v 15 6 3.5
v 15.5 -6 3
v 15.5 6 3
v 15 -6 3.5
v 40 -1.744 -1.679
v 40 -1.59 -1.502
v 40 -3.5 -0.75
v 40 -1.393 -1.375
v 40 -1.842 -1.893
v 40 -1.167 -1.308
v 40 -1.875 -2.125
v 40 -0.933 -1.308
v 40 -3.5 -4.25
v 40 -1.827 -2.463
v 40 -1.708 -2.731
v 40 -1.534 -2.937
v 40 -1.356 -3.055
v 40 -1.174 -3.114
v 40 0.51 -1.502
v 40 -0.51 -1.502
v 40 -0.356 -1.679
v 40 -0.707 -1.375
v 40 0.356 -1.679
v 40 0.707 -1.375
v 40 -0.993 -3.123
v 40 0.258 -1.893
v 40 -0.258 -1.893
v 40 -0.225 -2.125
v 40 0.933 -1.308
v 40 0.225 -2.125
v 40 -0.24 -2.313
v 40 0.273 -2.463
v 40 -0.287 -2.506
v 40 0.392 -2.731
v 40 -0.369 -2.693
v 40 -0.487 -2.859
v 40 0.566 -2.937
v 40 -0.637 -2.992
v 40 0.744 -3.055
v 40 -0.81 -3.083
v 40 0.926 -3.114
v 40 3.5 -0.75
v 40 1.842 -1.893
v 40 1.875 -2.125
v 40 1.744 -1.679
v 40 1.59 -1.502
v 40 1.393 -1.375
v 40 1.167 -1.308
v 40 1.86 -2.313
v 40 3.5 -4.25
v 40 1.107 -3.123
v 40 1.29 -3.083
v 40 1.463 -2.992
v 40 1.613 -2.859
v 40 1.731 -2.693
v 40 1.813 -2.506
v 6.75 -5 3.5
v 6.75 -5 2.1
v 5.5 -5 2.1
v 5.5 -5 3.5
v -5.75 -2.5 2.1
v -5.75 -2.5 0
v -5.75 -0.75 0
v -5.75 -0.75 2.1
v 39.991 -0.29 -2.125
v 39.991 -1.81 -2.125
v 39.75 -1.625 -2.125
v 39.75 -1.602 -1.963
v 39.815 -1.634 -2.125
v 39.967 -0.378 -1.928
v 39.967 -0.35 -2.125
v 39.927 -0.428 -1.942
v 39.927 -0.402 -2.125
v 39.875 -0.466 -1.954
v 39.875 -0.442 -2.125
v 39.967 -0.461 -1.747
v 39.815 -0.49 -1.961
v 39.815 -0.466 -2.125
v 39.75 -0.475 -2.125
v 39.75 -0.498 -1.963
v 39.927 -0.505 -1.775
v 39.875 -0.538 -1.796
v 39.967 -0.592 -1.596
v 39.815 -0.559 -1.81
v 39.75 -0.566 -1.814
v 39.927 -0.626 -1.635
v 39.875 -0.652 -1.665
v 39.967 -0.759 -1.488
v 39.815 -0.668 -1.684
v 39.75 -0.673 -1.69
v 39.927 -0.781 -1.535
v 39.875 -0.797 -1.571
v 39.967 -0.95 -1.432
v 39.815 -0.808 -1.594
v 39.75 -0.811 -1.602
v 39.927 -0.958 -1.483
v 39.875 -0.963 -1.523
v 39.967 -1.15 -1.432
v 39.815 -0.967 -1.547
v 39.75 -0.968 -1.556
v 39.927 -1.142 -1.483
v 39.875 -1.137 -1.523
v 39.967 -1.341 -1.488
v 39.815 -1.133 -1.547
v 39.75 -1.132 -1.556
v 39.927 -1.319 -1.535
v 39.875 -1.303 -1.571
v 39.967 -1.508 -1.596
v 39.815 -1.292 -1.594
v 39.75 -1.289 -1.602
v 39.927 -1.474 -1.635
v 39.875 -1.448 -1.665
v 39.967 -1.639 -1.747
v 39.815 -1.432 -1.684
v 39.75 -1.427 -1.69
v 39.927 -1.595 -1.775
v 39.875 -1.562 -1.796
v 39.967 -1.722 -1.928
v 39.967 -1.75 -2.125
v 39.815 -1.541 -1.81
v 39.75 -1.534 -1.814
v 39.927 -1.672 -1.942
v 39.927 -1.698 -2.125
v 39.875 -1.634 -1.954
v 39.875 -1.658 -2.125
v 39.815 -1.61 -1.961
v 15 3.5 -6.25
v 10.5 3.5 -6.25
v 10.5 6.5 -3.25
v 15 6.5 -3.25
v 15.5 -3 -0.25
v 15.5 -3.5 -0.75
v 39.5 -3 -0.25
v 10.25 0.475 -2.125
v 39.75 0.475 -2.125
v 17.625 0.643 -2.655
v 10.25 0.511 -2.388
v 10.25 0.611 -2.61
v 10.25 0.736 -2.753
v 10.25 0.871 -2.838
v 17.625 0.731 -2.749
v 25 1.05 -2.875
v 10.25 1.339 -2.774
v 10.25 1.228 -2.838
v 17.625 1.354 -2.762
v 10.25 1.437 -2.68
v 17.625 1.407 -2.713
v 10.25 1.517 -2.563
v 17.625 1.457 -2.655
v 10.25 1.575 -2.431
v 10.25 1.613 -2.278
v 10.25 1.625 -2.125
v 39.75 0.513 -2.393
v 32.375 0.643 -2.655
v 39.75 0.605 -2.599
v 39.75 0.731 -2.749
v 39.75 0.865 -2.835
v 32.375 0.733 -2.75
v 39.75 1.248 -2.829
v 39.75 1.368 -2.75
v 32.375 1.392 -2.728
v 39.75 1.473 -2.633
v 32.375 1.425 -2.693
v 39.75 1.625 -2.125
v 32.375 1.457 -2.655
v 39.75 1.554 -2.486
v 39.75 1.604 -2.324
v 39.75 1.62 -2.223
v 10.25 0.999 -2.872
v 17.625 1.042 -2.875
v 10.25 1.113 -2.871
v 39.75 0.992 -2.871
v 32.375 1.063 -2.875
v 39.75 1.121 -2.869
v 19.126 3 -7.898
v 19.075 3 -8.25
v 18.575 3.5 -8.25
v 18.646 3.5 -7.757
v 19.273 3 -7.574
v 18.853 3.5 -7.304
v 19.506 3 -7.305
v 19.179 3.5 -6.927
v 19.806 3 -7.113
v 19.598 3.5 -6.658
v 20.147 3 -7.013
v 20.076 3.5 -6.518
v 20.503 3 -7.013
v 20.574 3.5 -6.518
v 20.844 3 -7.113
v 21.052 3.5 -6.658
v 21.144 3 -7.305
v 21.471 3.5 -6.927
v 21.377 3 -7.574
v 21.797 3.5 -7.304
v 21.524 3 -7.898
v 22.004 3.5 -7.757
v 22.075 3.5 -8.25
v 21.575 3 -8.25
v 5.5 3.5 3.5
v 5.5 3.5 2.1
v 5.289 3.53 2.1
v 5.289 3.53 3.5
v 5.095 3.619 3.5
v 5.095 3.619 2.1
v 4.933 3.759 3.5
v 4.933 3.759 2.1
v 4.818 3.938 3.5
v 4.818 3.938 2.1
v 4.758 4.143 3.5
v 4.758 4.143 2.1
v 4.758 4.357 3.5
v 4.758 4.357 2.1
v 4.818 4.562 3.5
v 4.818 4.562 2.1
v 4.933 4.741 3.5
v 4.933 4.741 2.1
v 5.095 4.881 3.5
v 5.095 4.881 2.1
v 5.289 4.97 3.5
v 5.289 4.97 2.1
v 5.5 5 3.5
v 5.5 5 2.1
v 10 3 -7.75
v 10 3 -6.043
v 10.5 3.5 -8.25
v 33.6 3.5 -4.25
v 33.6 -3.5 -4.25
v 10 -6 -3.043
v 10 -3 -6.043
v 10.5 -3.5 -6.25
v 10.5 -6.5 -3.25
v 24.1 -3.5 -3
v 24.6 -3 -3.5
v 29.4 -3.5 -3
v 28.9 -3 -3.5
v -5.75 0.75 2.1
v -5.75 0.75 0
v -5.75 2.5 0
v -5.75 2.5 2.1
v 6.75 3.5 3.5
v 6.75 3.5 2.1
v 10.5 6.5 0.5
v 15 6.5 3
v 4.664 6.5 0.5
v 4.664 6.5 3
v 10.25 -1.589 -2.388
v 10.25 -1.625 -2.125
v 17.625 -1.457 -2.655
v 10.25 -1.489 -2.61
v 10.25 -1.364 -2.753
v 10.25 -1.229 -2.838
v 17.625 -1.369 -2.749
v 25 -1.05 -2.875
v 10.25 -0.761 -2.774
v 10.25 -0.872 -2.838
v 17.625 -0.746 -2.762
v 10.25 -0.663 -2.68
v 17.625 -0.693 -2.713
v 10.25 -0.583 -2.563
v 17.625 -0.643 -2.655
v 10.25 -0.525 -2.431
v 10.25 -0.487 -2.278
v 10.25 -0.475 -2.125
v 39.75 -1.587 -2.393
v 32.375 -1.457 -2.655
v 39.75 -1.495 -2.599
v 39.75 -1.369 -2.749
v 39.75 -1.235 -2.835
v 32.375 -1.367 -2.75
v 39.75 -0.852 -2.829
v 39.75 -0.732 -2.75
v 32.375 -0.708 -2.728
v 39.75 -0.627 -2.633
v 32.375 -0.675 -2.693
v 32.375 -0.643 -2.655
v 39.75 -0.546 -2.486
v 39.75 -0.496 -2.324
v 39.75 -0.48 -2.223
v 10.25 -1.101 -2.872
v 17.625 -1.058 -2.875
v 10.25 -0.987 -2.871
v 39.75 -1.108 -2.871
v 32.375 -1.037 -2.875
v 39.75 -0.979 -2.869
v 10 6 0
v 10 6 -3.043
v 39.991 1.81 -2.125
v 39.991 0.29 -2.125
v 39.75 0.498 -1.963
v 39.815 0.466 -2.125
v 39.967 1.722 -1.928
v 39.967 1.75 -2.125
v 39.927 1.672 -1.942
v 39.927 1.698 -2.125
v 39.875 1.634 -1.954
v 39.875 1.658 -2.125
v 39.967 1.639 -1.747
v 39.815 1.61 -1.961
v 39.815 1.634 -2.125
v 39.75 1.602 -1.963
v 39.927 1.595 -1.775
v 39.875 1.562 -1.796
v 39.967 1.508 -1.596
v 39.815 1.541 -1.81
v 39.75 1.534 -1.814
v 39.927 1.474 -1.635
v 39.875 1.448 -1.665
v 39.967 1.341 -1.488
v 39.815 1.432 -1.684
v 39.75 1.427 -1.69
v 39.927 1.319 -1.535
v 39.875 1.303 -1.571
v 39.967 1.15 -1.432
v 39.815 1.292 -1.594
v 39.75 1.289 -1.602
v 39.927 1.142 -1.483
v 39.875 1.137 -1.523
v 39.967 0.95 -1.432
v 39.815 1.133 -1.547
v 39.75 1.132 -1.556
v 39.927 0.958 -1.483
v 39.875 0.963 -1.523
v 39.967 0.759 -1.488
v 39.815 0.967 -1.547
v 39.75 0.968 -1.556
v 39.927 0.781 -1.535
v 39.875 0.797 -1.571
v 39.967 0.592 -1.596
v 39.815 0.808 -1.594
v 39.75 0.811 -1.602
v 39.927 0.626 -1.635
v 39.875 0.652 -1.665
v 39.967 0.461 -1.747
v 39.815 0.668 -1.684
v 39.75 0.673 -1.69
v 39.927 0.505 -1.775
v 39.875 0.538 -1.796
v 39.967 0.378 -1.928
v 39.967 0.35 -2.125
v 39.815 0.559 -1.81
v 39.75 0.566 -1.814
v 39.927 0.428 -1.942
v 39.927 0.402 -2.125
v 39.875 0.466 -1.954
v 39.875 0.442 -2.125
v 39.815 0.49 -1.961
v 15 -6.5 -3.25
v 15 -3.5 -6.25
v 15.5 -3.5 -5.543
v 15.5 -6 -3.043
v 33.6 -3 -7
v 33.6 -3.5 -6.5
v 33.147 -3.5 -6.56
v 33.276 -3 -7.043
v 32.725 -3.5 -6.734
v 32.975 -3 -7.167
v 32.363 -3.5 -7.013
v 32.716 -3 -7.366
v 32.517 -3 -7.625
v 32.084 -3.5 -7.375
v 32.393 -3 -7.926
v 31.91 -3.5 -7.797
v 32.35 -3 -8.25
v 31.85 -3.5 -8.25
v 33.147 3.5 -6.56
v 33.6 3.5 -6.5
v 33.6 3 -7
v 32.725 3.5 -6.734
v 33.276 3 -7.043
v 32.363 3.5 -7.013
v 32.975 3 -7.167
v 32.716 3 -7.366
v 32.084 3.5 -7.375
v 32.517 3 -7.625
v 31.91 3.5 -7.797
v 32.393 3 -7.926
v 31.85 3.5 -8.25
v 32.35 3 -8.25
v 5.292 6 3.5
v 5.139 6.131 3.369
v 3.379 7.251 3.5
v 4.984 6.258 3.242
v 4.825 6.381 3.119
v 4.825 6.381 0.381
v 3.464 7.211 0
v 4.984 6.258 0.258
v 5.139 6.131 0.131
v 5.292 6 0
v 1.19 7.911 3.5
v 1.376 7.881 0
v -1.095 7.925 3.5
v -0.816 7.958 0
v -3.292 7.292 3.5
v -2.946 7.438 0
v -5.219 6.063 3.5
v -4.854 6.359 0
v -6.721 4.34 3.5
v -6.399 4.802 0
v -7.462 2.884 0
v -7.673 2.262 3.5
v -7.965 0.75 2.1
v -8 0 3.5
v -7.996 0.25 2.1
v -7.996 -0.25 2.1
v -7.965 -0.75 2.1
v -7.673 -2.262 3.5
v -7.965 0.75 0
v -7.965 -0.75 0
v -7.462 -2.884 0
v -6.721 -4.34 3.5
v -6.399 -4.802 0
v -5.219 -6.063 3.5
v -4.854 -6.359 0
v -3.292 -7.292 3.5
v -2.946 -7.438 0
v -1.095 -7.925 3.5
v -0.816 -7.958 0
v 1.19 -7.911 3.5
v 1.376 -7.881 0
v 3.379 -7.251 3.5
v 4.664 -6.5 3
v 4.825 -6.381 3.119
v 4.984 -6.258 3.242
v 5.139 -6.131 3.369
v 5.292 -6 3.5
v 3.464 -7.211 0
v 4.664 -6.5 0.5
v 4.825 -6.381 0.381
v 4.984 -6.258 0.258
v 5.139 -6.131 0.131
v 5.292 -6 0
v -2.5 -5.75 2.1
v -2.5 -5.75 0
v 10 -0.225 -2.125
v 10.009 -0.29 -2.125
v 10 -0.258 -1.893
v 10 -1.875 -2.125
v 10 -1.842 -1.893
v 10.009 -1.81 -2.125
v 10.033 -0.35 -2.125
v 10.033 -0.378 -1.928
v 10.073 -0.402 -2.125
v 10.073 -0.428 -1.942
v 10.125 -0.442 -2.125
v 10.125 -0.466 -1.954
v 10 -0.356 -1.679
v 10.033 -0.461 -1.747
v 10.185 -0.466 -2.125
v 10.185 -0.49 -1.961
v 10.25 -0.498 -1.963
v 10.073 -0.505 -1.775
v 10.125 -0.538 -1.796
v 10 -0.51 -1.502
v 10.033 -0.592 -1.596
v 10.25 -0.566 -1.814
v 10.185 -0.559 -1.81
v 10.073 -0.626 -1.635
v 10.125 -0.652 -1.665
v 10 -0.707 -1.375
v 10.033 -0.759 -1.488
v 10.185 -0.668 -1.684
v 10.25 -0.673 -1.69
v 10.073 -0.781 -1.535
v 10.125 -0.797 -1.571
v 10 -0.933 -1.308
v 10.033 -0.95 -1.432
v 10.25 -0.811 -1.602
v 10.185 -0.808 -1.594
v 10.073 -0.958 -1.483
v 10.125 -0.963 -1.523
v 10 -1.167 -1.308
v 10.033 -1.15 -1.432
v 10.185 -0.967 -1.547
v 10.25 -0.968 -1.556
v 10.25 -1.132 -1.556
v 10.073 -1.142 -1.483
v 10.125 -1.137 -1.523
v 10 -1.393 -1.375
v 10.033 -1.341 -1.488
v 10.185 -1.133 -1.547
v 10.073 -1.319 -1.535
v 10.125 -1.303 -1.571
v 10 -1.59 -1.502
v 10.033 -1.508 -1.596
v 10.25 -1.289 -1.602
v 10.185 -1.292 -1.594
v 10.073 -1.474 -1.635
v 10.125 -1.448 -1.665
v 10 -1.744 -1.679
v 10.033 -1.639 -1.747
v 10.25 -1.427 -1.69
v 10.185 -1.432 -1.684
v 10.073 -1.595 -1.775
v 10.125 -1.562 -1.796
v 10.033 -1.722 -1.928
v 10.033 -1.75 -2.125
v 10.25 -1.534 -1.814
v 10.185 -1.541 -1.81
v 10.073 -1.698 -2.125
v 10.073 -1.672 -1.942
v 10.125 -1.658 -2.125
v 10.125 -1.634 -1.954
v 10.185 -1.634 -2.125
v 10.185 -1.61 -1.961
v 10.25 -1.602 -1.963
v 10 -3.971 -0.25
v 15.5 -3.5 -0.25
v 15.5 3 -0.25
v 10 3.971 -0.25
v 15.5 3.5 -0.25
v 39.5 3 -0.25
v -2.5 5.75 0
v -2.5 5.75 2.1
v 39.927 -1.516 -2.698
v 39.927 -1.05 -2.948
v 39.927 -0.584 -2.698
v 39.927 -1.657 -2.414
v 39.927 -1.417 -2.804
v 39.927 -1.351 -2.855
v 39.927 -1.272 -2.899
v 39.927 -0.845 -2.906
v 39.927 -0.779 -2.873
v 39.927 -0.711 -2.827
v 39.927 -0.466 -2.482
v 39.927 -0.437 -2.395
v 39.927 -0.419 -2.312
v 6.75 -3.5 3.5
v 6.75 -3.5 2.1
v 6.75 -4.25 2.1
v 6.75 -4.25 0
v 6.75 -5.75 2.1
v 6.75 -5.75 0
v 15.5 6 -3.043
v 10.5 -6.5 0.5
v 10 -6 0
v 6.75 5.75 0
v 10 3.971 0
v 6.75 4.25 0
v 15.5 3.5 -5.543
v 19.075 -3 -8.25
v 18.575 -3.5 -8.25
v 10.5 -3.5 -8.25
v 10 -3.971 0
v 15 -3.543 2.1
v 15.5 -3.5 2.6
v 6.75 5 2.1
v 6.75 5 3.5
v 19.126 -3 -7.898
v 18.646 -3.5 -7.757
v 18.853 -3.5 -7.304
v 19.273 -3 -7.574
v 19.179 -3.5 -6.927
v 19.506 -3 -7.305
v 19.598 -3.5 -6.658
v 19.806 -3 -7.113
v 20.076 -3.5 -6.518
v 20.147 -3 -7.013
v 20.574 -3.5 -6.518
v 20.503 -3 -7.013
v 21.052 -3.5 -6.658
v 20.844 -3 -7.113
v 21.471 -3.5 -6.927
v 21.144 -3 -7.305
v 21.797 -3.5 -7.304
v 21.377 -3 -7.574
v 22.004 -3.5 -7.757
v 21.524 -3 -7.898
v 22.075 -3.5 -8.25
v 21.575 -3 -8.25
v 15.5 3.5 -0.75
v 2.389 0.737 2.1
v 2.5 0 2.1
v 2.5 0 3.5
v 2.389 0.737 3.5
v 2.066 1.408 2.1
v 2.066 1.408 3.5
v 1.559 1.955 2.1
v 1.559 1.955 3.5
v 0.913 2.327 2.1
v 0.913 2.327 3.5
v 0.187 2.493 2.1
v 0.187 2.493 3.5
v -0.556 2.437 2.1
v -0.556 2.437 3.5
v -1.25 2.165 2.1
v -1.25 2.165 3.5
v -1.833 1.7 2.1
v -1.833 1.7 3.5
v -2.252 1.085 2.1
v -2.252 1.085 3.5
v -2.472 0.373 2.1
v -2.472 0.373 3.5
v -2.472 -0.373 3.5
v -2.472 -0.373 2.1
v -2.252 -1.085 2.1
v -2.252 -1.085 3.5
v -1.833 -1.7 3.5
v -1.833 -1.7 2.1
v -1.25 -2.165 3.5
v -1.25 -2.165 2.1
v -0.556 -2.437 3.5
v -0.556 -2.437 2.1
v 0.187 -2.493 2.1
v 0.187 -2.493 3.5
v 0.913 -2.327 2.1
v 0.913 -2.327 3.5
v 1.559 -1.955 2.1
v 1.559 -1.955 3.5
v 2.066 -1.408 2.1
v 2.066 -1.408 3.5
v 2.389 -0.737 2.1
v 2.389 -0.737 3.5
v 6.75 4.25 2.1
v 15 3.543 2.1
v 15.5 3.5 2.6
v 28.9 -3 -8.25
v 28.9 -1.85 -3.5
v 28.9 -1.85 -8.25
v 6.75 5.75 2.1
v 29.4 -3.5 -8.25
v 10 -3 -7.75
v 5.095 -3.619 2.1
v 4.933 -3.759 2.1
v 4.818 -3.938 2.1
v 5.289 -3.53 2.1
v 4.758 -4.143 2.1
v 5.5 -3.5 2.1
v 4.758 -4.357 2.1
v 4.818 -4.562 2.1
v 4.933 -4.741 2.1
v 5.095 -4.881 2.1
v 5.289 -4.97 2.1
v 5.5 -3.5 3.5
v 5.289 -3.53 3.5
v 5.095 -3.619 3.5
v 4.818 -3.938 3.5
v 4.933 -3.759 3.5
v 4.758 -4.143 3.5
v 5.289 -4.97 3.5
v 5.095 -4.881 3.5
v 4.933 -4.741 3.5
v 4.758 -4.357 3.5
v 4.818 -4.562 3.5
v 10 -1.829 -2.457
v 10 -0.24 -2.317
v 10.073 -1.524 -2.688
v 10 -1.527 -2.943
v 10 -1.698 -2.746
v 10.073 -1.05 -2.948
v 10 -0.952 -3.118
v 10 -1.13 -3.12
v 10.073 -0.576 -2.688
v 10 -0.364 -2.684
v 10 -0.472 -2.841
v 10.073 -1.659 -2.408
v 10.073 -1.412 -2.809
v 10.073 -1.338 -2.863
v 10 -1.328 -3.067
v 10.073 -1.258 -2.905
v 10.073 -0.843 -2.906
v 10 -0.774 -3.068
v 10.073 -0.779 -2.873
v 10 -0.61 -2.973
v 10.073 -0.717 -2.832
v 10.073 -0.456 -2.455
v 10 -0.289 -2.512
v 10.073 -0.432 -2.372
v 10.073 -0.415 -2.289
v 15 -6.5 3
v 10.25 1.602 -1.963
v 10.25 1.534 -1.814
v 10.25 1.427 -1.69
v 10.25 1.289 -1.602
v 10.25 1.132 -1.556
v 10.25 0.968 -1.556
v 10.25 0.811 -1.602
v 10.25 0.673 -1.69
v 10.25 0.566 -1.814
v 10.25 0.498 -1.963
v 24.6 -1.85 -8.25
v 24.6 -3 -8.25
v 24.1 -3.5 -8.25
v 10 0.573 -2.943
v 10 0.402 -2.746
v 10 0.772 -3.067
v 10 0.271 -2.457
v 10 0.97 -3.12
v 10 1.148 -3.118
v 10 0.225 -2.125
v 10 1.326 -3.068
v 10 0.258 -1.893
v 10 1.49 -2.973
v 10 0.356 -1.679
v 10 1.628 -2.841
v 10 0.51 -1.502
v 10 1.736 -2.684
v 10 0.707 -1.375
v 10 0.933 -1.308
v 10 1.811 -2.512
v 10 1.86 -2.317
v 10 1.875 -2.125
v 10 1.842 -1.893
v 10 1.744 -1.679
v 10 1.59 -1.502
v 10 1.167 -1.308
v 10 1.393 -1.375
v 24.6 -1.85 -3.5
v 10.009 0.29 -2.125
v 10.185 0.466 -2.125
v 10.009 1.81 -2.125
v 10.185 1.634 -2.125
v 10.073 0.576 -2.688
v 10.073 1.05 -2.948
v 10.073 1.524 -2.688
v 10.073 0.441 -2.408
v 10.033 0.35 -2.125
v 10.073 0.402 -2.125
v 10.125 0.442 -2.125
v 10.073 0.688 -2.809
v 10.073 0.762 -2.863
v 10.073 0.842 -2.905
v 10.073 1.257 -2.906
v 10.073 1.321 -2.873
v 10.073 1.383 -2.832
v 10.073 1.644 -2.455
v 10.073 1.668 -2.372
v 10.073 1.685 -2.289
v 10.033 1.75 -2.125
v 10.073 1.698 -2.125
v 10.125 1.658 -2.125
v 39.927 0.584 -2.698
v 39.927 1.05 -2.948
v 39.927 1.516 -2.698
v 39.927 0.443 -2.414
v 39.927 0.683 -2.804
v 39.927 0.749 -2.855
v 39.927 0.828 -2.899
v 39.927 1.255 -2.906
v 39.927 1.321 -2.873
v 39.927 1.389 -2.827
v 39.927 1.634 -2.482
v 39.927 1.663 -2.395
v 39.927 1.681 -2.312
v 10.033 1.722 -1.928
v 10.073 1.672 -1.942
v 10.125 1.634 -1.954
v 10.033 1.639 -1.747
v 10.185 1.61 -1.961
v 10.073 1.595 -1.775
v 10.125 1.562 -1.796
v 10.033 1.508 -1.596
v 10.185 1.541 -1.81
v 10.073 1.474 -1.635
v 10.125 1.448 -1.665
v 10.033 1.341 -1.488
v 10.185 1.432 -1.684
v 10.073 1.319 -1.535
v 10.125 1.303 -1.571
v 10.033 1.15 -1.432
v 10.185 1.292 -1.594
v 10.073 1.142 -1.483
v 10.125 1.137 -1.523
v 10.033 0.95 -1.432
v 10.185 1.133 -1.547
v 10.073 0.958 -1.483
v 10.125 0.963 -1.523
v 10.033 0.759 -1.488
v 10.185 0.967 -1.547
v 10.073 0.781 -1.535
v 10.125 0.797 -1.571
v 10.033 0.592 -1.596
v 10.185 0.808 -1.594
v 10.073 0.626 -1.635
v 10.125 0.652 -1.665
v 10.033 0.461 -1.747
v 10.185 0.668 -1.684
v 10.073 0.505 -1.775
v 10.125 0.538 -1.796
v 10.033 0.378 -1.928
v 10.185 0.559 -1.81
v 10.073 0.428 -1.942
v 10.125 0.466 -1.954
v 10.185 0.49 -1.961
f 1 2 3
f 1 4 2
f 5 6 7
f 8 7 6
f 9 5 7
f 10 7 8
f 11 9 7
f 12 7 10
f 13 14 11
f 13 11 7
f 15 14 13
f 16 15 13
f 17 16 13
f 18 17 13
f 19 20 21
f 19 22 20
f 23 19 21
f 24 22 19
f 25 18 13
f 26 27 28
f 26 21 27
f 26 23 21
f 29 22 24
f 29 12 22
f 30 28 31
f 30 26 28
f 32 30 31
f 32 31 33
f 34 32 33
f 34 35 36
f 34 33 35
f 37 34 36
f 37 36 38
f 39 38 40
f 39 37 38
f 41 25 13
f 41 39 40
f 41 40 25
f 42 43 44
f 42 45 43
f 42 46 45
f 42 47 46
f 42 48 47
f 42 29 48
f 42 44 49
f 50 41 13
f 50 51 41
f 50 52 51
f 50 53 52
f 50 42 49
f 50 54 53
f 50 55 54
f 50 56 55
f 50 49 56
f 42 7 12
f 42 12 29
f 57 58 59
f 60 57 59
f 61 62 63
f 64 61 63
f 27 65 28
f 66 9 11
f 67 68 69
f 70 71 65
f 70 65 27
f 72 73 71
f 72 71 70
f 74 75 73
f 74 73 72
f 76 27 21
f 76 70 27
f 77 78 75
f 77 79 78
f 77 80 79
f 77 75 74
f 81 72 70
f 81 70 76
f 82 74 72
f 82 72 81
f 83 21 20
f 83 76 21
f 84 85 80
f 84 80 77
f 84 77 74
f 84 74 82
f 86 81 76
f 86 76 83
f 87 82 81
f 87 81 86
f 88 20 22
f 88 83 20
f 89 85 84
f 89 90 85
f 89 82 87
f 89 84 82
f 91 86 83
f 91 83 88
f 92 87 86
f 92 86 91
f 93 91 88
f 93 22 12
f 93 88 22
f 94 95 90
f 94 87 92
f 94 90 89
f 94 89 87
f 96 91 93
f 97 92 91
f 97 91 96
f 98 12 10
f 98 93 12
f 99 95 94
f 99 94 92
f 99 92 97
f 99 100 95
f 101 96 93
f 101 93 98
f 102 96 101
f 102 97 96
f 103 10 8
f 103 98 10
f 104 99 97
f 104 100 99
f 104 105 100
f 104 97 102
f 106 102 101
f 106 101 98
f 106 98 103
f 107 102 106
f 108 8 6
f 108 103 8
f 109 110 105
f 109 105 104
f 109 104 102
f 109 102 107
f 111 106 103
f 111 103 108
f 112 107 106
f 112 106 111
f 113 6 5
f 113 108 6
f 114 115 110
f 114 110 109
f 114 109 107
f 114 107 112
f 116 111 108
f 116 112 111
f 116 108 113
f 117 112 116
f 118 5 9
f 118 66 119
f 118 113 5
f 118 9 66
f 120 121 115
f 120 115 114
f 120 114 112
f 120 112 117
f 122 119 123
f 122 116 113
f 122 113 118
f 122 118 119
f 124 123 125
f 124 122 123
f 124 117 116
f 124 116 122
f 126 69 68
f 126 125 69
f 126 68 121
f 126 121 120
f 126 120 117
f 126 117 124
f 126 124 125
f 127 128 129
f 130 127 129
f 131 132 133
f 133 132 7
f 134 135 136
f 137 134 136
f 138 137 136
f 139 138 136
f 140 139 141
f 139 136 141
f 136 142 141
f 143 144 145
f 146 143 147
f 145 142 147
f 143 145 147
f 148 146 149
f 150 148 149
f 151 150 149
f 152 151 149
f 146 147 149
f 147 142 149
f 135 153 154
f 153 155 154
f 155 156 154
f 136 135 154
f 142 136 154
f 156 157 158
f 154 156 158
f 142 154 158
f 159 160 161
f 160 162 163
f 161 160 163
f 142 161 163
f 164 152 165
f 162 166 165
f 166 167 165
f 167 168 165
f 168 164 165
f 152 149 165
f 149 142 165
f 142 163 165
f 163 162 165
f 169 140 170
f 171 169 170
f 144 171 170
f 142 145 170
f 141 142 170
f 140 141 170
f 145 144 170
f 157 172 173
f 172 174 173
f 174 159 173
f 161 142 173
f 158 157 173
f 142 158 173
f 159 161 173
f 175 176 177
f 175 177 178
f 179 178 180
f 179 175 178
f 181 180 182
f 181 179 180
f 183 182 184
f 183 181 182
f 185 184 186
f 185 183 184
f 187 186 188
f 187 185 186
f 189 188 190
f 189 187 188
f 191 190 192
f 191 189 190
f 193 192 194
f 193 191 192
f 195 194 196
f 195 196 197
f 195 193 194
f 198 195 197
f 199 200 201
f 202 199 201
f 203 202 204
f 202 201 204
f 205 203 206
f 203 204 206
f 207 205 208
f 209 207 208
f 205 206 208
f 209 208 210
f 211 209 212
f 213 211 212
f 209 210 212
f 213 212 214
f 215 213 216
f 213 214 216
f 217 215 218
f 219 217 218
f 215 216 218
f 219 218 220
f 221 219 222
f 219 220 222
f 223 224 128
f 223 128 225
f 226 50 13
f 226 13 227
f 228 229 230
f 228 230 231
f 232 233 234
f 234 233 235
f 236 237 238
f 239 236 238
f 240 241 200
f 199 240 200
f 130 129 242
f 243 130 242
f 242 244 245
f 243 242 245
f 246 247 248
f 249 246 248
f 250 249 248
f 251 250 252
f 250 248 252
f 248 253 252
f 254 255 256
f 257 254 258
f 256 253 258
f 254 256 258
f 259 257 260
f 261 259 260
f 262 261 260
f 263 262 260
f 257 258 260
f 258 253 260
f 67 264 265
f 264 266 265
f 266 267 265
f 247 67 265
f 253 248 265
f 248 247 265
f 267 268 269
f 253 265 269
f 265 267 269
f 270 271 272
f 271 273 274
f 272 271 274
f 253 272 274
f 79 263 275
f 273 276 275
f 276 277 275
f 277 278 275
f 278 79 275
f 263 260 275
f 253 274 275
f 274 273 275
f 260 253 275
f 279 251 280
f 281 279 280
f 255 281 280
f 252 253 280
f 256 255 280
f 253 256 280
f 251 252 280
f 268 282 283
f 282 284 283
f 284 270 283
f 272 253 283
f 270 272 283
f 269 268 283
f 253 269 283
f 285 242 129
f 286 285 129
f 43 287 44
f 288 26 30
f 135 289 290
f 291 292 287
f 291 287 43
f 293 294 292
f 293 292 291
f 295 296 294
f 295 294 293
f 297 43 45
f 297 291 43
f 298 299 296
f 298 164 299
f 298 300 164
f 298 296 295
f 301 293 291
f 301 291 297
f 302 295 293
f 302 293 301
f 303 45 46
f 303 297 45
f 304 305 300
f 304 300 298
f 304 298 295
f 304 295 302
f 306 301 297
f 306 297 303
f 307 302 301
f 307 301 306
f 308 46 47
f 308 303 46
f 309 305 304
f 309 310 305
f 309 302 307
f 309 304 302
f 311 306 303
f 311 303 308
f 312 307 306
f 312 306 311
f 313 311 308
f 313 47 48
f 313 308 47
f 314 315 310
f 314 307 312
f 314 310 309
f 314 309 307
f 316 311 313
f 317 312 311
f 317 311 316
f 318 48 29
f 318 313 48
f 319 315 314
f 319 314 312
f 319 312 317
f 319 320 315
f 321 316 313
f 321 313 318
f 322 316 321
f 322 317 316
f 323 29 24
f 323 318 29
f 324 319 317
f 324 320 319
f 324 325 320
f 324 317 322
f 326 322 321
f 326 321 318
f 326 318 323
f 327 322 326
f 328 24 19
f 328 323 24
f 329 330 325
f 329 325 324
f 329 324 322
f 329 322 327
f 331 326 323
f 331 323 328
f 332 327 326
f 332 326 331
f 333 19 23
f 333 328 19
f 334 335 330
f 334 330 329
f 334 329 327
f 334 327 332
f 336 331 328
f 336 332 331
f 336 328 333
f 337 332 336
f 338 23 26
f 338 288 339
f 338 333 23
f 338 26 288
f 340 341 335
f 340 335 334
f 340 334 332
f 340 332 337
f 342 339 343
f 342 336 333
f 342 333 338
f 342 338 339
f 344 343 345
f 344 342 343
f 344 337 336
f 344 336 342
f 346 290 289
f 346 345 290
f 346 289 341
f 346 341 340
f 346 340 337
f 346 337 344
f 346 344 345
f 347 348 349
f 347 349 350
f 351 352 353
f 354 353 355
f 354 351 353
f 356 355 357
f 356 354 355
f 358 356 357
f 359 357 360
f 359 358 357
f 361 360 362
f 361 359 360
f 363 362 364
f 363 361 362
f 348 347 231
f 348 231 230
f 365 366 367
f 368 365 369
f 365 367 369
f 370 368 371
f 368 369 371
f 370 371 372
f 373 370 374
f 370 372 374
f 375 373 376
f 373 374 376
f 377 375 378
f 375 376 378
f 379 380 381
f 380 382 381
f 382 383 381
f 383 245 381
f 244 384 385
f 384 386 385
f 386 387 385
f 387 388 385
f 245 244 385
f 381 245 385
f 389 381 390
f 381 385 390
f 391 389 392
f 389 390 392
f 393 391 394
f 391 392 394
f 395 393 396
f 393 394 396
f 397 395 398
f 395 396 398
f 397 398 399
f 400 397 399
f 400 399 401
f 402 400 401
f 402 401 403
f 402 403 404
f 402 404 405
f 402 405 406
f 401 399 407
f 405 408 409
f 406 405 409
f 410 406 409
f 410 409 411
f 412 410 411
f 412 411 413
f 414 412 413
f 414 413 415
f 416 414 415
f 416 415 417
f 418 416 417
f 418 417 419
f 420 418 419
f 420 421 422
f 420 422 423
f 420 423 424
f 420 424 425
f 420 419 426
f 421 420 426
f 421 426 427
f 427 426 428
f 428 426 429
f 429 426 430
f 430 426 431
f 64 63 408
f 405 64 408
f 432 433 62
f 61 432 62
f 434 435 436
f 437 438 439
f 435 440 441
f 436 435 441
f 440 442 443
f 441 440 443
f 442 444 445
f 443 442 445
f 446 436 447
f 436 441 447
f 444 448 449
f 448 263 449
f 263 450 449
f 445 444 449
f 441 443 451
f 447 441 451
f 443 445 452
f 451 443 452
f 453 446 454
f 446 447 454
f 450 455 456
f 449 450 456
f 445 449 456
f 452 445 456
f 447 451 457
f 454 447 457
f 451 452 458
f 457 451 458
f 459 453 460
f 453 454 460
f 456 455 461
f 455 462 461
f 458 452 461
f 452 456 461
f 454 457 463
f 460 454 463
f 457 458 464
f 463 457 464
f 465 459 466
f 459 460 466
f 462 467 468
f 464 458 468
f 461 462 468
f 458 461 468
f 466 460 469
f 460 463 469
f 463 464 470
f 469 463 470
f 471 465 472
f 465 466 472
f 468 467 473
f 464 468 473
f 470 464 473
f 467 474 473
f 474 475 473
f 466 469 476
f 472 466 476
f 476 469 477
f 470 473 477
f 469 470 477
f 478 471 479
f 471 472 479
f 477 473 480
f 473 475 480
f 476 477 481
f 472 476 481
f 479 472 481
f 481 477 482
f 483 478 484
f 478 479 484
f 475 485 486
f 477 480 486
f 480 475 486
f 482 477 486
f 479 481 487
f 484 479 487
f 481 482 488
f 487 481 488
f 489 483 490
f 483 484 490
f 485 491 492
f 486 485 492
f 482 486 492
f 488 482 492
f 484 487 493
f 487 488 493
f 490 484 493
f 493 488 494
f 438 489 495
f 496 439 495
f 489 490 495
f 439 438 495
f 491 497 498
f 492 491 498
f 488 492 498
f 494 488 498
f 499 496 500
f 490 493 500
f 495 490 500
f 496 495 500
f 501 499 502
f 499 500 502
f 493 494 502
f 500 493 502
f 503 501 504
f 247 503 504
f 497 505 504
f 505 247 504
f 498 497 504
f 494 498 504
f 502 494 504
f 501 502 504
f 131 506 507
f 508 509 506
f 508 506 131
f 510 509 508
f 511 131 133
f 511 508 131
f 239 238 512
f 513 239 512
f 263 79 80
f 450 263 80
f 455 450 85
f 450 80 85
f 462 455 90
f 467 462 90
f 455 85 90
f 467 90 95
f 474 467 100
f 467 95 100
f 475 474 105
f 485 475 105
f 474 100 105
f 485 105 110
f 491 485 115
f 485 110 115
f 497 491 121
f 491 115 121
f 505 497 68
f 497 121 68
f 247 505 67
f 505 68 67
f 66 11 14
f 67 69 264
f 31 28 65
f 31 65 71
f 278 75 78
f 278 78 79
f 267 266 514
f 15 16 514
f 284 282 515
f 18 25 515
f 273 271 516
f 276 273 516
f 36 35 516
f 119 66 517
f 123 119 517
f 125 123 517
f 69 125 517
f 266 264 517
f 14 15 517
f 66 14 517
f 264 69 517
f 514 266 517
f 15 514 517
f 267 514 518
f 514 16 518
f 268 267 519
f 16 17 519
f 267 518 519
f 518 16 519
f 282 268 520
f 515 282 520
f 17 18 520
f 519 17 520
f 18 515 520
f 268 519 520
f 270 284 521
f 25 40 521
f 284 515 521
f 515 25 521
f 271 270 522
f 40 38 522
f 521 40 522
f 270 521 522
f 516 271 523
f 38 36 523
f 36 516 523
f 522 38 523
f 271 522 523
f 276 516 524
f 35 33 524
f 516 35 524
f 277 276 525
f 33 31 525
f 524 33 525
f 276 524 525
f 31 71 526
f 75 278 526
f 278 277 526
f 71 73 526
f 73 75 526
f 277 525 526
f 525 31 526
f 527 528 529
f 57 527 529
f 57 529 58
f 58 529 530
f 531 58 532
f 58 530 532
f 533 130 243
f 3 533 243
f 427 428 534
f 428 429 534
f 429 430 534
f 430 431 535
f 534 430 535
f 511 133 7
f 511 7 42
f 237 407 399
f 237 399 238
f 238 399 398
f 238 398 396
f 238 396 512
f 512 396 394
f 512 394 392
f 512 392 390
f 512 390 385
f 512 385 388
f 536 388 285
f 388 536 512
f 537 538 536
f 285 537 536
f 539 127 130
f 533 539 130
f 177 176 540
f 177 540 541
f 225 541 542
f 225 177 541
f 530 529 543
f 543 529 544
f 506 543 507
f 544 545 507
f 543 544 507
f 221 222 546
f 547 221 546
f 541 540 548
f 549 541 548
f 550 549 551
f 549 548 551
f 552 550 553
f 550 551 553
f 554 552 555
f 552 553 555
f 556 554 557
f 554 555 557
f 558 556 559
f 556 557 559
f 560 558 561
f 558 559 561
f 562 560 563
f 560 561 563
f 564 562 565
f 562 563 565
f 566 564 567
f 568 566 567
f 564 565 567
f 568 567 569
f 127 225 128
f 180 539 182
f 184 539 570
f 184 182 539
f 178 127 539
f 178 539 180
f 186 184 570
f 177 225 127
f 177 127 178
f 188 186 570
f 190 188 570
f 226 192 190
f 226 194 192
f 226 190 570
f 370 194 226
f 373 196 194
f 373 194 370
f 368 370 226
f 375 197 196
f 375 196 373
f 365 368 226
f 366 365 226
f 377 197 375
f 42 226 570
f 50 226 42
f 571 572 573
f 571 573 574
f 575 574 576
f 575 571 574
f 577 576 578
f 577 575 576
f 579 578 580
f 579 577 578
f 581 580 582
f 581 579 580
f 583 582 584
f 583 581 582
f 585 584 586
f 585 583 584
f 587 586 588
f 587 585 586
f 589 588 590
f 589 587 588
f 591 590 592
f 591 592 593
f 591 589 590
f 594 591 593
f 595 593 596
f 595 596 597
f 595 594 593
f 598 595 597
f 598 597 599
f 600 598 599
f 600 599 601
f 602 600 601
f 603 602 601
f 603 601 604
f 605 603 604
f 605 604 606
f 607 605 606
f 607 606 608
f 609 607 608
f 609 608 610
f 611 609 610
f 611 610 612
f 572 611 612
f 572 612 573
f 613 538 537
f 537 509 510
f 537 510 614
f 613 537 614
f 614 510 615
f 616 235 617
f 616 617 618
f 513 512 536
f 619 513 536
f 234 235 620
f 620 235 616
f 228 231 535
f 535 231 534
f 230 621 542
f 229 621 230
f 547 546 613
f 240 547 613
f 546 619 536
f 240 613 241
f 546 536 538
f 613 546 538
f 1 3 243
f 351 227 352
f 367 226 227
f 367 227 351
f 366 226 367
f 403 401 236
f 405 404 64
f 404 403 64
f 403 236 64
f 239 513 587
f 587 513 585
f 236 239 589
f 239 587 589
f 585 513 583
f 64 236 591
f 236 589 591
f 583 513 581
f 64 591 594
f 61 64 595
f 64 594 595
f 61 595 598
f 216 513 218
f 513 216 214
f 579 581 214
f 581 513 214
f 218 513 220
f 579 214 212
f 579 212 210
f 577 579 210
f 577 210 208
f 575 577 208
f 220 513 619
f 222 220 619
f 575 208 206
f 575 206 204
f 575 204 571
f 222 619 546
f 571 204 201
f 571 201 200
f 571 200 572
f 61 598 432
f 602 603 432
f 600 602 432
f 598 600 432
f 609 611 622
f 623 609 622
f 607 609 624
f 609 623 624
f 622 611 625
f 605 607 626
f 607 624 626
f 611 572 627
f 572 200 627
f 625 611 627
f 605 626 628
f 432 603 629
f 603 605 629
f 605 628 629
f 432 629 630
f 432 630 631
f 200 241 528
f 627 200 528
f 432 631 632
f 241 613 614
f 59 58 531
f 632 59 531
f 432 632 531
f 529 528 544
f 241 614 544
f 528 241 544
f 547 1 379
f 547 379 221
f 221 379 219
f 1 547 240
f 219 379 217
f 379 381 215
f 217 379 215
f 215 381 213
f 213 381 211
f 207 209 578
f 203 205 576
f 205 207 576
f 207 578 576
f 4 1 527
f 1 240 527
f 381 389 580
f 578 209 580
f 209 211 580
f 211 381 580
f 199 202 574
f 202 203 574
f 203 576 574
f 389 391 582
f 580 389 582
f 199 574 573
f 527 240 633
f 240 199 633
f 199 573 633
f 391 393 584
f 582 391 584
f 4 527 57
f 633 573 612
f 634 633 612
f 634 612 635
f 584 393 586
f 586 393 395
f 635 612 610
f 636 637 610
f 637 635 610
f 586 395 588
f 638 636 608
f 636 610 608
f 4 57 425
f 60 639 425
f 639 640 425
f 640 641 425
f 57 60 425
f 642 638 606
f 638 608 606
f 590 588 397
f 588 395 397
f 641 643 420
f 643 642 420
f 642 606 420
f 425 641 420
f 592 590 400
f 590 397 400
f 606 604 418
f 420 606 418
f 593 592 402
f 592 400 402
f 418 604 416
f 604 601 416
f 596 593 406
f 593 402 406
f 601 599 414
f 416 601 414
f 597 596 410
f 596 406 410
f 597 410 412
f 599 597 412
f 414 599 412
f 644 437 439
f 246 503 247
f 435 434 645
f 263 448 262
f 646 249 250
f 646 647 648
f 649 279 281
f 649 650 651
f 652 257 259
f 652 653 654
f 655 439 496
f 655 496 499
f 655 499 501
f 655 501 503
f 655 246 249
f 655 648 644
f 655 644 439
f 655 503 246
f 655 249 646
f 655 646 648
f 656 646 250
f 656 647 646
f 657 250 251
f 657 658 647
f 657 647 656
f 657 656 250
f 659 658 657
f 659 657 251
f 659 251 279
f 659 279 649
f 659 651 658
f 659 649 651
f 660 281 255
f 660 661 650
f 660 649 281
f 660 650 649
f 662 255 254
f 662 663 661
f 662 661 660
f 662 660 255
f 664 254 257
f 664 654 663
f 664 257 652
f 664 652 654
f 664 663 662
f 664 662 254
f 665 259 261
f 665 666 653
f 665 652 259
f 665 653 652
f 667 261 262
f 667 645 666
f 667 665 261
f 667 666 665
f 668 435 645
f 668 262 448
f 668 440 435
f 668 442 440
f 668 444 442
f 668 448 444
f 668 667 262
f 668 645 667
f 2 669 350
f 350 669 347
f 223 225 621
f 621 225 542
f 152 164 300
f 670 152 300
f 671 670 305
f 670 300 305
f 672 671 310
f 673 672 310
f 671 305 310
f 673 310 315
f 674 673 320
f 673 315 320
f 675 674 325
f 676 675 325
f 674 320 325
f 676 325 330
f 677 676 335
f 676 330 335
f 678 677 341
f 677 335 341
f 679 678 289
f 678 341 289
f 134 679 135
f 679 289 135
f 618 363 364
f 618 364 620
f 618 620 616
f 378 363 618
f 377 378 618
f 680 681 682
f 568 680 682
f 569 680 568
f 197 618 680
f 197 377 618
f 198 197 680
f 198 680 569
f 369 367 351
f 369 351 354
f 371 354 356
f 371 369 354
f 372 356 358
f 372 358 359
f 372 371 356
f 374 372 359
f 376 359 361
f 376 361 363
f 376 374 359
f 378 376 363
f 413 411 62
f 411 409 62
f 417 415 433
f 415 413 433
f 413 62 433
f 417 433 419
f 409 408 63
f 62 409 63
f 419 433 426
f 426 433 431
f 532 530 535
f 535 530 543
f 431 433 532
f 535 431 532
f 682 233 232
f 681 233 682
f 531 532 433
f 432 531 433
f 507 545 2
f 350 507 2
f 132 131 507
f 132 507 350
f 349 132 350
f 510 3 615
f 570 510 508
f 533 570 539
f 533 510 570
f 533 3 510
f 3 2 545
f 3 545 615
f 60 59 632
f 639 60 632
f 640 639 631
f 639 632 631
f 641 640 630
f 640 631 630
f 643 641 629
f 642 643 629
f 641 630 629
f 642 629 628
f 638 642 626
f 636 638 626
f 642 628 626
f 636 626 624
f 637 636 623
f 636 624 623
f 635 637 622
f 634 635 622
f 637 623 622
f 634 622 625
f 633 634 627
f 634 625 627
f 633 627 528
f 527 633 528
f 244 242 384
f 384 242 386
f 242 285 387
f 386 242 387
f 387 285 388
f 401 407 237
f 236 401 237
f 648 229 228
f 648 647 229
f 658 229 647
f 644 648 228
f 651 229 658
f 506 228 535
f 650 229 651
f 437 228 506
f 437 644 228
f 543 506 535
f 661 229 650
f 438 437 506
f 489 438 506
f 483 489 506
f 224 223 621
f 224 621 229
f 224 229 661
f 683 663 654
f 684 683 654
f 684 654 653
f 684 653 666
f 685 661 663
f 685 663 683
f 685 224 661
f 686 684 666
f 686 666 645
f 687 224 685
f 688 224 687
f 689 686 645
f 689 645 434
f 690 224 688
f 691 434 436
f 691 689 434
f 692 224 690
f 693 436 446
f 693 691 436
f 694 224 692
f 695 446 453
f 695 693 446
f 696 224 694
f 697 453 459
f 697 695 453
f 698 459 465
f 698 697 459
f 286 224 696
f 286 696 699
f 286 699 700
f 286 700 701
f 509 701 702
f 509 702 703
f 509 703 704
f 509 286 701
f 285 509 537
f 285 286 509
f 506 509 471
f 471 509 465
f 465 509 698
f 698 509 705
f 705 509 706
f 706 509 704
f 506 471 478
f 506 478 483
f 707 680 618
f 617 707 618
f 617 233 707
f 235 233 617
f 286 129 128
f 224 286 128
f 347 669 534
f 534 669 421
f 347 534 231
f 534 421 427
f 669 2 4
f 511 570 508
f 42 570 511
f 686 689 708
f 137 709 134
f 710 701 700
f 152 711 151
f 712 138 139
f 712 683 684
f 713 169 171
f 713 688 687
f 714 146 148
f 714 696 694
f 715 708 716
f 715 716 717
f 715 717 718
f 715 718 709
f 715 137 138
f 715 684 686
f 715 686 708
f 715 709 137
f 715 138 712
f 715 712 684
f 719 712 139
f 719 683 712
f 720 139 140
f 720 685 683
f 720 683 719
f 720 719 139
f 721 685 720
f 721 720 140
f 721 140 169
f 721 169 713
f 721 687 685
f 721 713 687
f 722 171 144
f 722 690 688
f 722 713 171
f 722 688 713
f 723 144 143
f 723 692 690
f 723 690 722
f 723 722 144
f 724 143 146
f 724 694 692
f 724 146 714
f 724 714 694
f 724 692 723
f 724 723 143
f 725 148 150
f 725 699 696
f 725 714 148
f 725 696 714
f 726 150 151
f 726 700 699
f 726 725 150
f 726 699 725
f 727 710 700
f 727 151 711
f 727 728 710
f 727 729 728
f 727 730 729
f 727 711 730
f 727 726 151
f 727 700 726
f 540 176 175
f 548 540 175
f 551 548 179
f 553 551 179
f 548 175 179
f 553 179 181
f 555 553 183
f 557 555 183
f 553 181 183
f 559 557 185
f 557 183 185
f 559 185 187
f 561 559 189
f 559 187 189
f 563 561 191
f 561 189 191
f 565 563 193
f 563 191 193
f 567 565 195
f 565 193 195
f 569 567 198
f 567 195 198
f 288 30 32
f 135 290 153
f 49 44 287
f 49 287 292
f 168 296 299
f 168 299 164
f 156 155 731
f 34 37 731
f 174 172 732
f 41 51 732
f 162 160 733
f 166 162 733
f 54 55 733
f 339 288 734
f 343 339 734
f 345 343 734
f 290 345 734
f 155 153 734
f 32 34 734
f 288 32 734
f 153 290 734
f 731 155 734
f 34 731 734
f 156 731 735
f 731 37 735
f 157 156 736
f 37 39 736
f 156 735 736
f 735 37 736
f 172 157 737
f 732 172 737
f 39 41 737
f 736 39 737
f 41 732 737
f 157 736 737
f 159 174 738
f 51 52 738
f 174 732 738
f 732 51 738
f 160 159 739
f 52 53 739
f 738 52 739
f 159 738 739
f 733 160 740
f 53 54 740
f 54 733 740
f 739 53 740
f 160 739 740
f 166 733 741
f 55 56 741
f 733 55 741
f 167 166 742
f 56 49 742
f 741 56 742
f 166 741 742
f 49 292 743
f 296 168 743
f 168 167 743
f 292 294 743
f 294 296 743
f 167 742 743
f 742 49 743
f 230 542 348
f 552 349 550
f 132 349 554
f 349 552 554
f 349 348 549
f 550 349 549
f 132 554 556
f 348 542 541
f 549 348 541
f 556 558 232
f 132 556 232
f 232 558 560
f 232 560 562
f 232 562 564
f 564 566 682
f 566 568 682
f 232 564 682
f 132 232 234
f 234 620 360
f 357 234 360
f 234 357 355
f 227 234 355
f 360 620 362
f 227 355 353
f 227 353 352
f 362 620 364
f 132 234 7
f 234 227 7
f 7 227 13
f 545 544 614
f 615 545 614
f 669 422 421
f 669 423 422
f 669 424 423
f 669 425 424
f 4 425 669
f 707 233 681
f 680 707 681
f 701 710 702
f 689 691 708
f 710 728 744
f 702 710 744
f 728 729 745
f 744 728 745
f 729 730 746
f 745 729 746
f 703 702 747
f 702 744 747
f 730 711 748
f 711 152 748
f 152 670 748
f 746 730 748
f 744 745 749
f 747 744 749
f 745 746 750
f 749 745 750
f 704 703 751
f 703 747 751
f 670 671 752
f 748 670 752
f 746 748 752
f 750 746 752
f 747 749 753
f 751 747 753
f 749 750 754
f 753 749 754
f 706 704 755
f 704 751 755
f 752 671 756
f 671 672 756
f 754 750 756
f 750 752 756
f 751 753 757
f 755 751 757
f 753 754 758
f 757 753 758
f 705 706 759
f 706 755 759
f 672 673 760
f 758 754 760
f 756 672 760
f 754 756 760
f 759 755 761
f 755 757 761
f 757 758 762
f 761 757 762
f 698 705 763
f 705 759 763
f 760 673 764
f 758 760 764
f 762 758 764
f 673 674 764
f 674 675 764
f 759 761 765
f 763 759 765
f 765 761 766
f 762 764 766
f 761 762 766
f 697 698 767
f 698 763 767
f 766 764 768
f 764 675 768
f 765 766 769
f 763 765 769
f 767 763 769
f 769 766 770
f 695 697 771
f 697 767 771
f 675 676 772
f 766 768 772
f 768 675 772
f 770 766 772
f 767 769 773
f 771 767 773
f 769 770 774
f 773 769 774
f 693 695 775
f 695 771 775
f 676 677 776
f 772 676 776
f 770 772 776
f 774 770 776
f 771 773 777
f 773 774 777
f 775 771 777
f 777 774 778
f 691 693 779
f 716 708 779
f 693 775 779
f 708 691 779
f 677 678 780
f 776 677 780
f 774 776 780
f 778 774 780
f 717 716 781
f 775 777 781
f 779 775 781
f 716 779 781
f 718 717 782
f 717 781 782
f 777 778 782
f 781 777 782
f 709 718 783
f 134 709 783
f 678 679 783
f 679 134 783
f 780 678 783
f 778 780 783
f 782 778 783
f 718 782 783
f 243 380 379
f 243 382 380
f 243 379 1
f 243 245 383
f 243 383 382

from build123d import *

# Parameters (mm, degrees)
SKETCH1_R            = 2.5
BOSS_EXTRUDE1_DEPTH  = 3.5
CUT_EXTRUDE17_DEPTH  = 2.1
BOSS_EXTRUDE11_DEPTH = 5
BOSS_EXTRUDE4_DEPTH  = 25
SKETCH7_W            = 8.9
SKETCH7_H            = 13
CUT_EXTRUDE2_DEPTH   = 4
SKETCH22_W           = 24.5
SKETCH22_H           = 13
CUT_EXTRUDE13_DEPTH  = 3.75
SKETCH23_W           = 24.5
SKETCH23_H           = 8
CUT_EXTRUDE14_DEPTH  = 3
CUT_EXTRUDE11_DEPTH  = 50.35648387
BOSS_EXTRUDE12_DEPTH = 7
SKETCH24_R           = 1.25
CUT_EXTRUDE15_DEPTH  = 43.430089673
SKETCH26_W           = 4.3
SKETCH26_H           = 4.75
CUT_EXTRUDE16_DEPTH  = 1.65
FILLET8_R            = 0.25
CHAMFER1_SIZE        = 0.5


with BuildPart() as part:
    # Sketch1 → Boss-Extrude1 (new body)
    with BuildSketch(Plane.XY):
        with BuildLine():
            ThreePointArc((4.663689527, 6.5), (-8, 0), (4.663689527, -6.5))
            Line((4.663689527, -6.5), (15, -6.5))
            Line((15, -6.5), (15, 6.5))
            Line((15, 6.5), (4.663689527, 6.5))
        make_face()
        with BuildLine():
            Line((5.5, 5), (6.75, 5))
            Line((6.75, 5), (6.75, 3.5))
            Line((6.75, 3.5), (5.5, 3.5))
            ThreePointArc((5.5, 3.5), (4.75, 4.25), (5.5, 5))
        make_face(mode=Mode.SUBTRACT)
        with BuildLine():
            Line((6.75, -3.5), (6.75, -5))
            Line((6.75, -5), (5.5, -5))
            ThreePointArc((5.5, -5), (4.75, -4.25), (5.5, -3.5))
            Line((5.5, -3.5), (6.75, -3.5))
        make_face(mode=Mode.SUBTRACT)
        Circle(SKETCH1_R, mode=Mode.SUBTRACT)
    extrude(amount=BOSS_EXTRUDE1_DEPTH)

    # Sketch39 → Cut-Extrude17 (cut)
    with BuildSketch(Plane(origin=(0, 0, 0), x_dir=(-1, 0, 0), z_dir=(0, 0, -1))):
        Polygon((5.75, 0.75), (5.75, 2.5), (2.5, 5.75), (-6.75, 5.75), (-6.75, -5.75), (2.5, -5.75), (5.75, -2.5), (5.75, -0.75), (8.376697216, -0.75), (8.376697216, 0.75), align=None)
    extrude(amount=-CUT_EXTRUDE17_DEPTH, mode=Mode.SUBTRACT)

    # Sketch38 → Boss-Extrude11 (add)
    with BuildSketch(Plane(origin=(15, 0, 0), x_dir=(0, 0, -1), z_dir=(1, 0, 0))):
        Polygon((-3.5, 6.5), (3.25, 6.5), (6.25, 3.5), (8.25, 3.5), (8.25, -3.5), (6.25, -3.5), (3.25, -6.5), (-3.5, -6.5), align=None)
    extrude(amount=-BOSS_EXTRUDE11_DEPTH)

    # Sketch6 → Boss-Extrude4 (add)
    with BuildSketch(Plane(origin=(15, 0, 0), x_dir=(0, 0, -1), z_dir=(1, 0, 0))):
        Polygon((6.25, 3.5), (3.25, 6.5), (-3.5, 6.5), (-3.5, -6.5), (3.25, -6.5), (6.25, -3.5), (8.25, -3.5), (8.25, 3.5), align=None)
    extrude(amount=BOSS_EXTRUDE4_DEPTH)

    # Sketch7 → Cut-Extrude2 (cut)
    with BuildSketch(Plane(origin=(0, 0, -8.25), x_dir=(-1, 0, 0), z_dir=(0, 0, -1))):
        with Locations((-35.55, 0)):
            Rectangle(SKETCH7_W, SKETCH7_H)
    extrude(amount=-CUT_EXTRUDE2_DEPTH, mode=Mode.SUBTRACT)

    # Sketch22 → Cut-Extrude13 (cut)
    with BuildSketch(Plane.XY.offset(3.5)):
        with Locations((27.75, 0)):
            Rectangle(SKETCH22_W, SKETCH22_H)
    extrude(amount=-CUT_EXTRUDE13_DEPTH, mode=Mode.SUBTRACT)

    # Sketch23 → Cut-Extrude14 (cut)
    with BuildSketch(Plane(origin=(0, 6.5, 0), x_dir=(1, 0, 0), z_dir=(0, 1, 0))):
        with Locations((27.75, 4.25)):
            Rectangle(SKETCH23_W, SKETCH23_H)
    cut_extrude14 = extrude(amount=-CUT_EXTRUDE14_DEPTH, mode=Mode.SUBTRACT)

    # Mirror1: Cut-Extrude14 across plane
    add(cut_extrude14.mirror(Plane.ZX), mode=Mode.SUBTRACT)

    # Sketch19 → Cut-Extrude11 (cut, through all)
    with BuildSketch(Plane(origin=(40, 0, 0), x_dir=(0, 0, -1), z_dir=(1, 0, 0))):
        with BuildLine():
            ThreePointArc((2.125, -0.475), (1.55, -1.05), (2.125, -1.625))
            add(Edge.make_bspline(
                [(2.125, -1.625), (2.875, -1.625), (2.875, -1.05), (2.875, -0.475), (2.125, -0.475)],
                knots=[4.71238898, 4.71238898, 4.71238898, 6.283185307, 6.283185307, 7.853981634, 7.853981634, 7.853981634], degree=2, weights=[1, 0.707106781, 1, 0.707106781, 1]))
        make_face()
        with BuildLine():
            ThreePointArc((2.125, 1.625), (1.55, 1.05), (2.125, 0.475))
            add(Edge.make_bspline(
                [(2.125, 0.475), (2.875, 0.475), (2.875, 1.05), (2.875, 1.625), (2.125, 1.625)],
                knots=[4.71238898, 4.71238898, 4.71238898, 6.283185307, 6.283185307, 7.853981634, 7.853981634, 7.853981634], degree=2, weights=[1, 0.707106781, 1, 0.707106781, 1]))
        make_face()
    extrude(amount=-CUT_EXTRUDE11_DEPTH, mode=Mode.SUBTRACT)

    # Sketch25 → Boss-Extrude12 (add)
    with BuildSketch(Plane(origin=(0, 3.5, 0), x_dir=(1, 0, 0), z_dir=(0, 1, 0))):
        with BuildLine():
            Line((31.1, 4.25), (33.6, 4.25))
            Line((33.6, 4.25), (33.6, 7))
            ThreePointArc((33.6, 7), (32.716116524, 7.366116524), (32.35, 8.25))
            Line((32.35, 8.25), (31.1, 8.25))
            Line((31.1, 8.25), (31.1, 4.25))
        make_face()
    extrude(amount=-BOSS_EXTRUDE12_DEPTH)

    # Sketch24 → Cut-Extrude15 (cut, through all)
    with BuildSketch(Plane(origin=(0, 3.5, 0), x_dir=(1, 0, 0), z_dir=(0, 1, 0))):
        with Locations((20.325, 8.25)):
            Circle(SKETCH24_R)
    extrude(amount=-CUT_EXTRUDE15_DEPTH, mode=Mode.SUBTRACT)

    # Sketch26 → Cut-Extrude16 (cut)
    with BuildSketch(Plane(origin=(0, -3.5, 0), x_dir=(1, 0, 0), z_dir=(0, 1, 0))):
        with Locations((26.75, 5.875)):
            Rectangle(SKETCH26_W, SKETCH26_H)
    extrude(amount=CUT_EXTRUDE16_DEPTH, mode=Mode.SUBTRACT)

    # Fillet8
    fillet8_edges = [part.edges().sort_by_distance(p)[0] for p in [
        (10, 1.05, -1.55),
        (10, 1.05, -2.875),
        (10, -1.05, -1.55),
        (10, -1.05, -2.875),
        (40, -1.05, -2.875),
        (40, -1.05, -1.55),
        (40, 1.05, -2.875),
        (40, 1.05, -1.55),
    ]]
    fillet(fillet8_edges, radius=FILLET8_R)

    # Sketch41 → Cut-Loft1 section 0
    with BuildSketch(Plane.ZY.offset(-6.75)):
        with BuildLine():
            Line((2.1, -4.25), (-0.25, -4.25))
            Line((-0.25, -4.25), (-0.25, 4.25))
            Line((-0.25, 4.25), (2.1, 4.25))
            Line((2.1, 4.25), (2.1, -4.25))
        make_face()
    # Sketch40 → Cut-Loft1 section 1
    with BuildSketch(Plane(origin=(15.5, 0, 0), x_dir=(0, 0, -1), z_dir=(1, 0, 0))):
        with BuildLine():
            Line((-2.1, 3.5), (0.25, 3.5))
            Line((0.25, 3.5), (0.25, -3.5))
            Line((0.25, -3.5), (-2.1, -3.5))
            Line((-2.1, -3.5), (-2.1, 3.5))
        make_face()
    loft(mode=Mode.SUBTRACT)

    # Chamfer1
    chamfer1_edges = [part.edges().sort_by_distance(p)[0] for p in [
        (10, 6.5, -1.625),
        (10, 5, -4.75),
        (10, 3.5, -7.25),
        (10, 0, -8.25),
        (10, -3.5, -7.25),
        (10, -5, -4.75),
        (10, -6.5, -1.625),
        (15.5, 0, 2.1),
        (15.5, -5, -4.75),
        (15.5, 5, -4.75),
        (15.5, 6.5, 0.125),
        (15.5, 0, 3.5),
        (15.5, -6.5, 0.125),
        (27.75, 3.5, -0.25),
        (40, 0, -0.25),
        (27.75, -3.5, -0.25),
        (24.6, -3.5, -5.875),
        (26.75, -3.5, -3.5),
        (28.9, -3.5, -5.875),
        (32.716116524, -3.5, -7.366116524),
        (32.716116524, 3.5, -7.366116524),
        (20.325, 3.5, -7),
        (20.325, -3.5, -7),
        (7.331844763, -6.5, 0),
        (7.331844763, 6.5, 0),
        (10.081844763, -6.5, 3.5),
        (10.081844763, 6.5, 3.5),
    ]]
    chamfer(chamfer1_edges, length=CHAMFER1_SIZE)


solid = part.part
